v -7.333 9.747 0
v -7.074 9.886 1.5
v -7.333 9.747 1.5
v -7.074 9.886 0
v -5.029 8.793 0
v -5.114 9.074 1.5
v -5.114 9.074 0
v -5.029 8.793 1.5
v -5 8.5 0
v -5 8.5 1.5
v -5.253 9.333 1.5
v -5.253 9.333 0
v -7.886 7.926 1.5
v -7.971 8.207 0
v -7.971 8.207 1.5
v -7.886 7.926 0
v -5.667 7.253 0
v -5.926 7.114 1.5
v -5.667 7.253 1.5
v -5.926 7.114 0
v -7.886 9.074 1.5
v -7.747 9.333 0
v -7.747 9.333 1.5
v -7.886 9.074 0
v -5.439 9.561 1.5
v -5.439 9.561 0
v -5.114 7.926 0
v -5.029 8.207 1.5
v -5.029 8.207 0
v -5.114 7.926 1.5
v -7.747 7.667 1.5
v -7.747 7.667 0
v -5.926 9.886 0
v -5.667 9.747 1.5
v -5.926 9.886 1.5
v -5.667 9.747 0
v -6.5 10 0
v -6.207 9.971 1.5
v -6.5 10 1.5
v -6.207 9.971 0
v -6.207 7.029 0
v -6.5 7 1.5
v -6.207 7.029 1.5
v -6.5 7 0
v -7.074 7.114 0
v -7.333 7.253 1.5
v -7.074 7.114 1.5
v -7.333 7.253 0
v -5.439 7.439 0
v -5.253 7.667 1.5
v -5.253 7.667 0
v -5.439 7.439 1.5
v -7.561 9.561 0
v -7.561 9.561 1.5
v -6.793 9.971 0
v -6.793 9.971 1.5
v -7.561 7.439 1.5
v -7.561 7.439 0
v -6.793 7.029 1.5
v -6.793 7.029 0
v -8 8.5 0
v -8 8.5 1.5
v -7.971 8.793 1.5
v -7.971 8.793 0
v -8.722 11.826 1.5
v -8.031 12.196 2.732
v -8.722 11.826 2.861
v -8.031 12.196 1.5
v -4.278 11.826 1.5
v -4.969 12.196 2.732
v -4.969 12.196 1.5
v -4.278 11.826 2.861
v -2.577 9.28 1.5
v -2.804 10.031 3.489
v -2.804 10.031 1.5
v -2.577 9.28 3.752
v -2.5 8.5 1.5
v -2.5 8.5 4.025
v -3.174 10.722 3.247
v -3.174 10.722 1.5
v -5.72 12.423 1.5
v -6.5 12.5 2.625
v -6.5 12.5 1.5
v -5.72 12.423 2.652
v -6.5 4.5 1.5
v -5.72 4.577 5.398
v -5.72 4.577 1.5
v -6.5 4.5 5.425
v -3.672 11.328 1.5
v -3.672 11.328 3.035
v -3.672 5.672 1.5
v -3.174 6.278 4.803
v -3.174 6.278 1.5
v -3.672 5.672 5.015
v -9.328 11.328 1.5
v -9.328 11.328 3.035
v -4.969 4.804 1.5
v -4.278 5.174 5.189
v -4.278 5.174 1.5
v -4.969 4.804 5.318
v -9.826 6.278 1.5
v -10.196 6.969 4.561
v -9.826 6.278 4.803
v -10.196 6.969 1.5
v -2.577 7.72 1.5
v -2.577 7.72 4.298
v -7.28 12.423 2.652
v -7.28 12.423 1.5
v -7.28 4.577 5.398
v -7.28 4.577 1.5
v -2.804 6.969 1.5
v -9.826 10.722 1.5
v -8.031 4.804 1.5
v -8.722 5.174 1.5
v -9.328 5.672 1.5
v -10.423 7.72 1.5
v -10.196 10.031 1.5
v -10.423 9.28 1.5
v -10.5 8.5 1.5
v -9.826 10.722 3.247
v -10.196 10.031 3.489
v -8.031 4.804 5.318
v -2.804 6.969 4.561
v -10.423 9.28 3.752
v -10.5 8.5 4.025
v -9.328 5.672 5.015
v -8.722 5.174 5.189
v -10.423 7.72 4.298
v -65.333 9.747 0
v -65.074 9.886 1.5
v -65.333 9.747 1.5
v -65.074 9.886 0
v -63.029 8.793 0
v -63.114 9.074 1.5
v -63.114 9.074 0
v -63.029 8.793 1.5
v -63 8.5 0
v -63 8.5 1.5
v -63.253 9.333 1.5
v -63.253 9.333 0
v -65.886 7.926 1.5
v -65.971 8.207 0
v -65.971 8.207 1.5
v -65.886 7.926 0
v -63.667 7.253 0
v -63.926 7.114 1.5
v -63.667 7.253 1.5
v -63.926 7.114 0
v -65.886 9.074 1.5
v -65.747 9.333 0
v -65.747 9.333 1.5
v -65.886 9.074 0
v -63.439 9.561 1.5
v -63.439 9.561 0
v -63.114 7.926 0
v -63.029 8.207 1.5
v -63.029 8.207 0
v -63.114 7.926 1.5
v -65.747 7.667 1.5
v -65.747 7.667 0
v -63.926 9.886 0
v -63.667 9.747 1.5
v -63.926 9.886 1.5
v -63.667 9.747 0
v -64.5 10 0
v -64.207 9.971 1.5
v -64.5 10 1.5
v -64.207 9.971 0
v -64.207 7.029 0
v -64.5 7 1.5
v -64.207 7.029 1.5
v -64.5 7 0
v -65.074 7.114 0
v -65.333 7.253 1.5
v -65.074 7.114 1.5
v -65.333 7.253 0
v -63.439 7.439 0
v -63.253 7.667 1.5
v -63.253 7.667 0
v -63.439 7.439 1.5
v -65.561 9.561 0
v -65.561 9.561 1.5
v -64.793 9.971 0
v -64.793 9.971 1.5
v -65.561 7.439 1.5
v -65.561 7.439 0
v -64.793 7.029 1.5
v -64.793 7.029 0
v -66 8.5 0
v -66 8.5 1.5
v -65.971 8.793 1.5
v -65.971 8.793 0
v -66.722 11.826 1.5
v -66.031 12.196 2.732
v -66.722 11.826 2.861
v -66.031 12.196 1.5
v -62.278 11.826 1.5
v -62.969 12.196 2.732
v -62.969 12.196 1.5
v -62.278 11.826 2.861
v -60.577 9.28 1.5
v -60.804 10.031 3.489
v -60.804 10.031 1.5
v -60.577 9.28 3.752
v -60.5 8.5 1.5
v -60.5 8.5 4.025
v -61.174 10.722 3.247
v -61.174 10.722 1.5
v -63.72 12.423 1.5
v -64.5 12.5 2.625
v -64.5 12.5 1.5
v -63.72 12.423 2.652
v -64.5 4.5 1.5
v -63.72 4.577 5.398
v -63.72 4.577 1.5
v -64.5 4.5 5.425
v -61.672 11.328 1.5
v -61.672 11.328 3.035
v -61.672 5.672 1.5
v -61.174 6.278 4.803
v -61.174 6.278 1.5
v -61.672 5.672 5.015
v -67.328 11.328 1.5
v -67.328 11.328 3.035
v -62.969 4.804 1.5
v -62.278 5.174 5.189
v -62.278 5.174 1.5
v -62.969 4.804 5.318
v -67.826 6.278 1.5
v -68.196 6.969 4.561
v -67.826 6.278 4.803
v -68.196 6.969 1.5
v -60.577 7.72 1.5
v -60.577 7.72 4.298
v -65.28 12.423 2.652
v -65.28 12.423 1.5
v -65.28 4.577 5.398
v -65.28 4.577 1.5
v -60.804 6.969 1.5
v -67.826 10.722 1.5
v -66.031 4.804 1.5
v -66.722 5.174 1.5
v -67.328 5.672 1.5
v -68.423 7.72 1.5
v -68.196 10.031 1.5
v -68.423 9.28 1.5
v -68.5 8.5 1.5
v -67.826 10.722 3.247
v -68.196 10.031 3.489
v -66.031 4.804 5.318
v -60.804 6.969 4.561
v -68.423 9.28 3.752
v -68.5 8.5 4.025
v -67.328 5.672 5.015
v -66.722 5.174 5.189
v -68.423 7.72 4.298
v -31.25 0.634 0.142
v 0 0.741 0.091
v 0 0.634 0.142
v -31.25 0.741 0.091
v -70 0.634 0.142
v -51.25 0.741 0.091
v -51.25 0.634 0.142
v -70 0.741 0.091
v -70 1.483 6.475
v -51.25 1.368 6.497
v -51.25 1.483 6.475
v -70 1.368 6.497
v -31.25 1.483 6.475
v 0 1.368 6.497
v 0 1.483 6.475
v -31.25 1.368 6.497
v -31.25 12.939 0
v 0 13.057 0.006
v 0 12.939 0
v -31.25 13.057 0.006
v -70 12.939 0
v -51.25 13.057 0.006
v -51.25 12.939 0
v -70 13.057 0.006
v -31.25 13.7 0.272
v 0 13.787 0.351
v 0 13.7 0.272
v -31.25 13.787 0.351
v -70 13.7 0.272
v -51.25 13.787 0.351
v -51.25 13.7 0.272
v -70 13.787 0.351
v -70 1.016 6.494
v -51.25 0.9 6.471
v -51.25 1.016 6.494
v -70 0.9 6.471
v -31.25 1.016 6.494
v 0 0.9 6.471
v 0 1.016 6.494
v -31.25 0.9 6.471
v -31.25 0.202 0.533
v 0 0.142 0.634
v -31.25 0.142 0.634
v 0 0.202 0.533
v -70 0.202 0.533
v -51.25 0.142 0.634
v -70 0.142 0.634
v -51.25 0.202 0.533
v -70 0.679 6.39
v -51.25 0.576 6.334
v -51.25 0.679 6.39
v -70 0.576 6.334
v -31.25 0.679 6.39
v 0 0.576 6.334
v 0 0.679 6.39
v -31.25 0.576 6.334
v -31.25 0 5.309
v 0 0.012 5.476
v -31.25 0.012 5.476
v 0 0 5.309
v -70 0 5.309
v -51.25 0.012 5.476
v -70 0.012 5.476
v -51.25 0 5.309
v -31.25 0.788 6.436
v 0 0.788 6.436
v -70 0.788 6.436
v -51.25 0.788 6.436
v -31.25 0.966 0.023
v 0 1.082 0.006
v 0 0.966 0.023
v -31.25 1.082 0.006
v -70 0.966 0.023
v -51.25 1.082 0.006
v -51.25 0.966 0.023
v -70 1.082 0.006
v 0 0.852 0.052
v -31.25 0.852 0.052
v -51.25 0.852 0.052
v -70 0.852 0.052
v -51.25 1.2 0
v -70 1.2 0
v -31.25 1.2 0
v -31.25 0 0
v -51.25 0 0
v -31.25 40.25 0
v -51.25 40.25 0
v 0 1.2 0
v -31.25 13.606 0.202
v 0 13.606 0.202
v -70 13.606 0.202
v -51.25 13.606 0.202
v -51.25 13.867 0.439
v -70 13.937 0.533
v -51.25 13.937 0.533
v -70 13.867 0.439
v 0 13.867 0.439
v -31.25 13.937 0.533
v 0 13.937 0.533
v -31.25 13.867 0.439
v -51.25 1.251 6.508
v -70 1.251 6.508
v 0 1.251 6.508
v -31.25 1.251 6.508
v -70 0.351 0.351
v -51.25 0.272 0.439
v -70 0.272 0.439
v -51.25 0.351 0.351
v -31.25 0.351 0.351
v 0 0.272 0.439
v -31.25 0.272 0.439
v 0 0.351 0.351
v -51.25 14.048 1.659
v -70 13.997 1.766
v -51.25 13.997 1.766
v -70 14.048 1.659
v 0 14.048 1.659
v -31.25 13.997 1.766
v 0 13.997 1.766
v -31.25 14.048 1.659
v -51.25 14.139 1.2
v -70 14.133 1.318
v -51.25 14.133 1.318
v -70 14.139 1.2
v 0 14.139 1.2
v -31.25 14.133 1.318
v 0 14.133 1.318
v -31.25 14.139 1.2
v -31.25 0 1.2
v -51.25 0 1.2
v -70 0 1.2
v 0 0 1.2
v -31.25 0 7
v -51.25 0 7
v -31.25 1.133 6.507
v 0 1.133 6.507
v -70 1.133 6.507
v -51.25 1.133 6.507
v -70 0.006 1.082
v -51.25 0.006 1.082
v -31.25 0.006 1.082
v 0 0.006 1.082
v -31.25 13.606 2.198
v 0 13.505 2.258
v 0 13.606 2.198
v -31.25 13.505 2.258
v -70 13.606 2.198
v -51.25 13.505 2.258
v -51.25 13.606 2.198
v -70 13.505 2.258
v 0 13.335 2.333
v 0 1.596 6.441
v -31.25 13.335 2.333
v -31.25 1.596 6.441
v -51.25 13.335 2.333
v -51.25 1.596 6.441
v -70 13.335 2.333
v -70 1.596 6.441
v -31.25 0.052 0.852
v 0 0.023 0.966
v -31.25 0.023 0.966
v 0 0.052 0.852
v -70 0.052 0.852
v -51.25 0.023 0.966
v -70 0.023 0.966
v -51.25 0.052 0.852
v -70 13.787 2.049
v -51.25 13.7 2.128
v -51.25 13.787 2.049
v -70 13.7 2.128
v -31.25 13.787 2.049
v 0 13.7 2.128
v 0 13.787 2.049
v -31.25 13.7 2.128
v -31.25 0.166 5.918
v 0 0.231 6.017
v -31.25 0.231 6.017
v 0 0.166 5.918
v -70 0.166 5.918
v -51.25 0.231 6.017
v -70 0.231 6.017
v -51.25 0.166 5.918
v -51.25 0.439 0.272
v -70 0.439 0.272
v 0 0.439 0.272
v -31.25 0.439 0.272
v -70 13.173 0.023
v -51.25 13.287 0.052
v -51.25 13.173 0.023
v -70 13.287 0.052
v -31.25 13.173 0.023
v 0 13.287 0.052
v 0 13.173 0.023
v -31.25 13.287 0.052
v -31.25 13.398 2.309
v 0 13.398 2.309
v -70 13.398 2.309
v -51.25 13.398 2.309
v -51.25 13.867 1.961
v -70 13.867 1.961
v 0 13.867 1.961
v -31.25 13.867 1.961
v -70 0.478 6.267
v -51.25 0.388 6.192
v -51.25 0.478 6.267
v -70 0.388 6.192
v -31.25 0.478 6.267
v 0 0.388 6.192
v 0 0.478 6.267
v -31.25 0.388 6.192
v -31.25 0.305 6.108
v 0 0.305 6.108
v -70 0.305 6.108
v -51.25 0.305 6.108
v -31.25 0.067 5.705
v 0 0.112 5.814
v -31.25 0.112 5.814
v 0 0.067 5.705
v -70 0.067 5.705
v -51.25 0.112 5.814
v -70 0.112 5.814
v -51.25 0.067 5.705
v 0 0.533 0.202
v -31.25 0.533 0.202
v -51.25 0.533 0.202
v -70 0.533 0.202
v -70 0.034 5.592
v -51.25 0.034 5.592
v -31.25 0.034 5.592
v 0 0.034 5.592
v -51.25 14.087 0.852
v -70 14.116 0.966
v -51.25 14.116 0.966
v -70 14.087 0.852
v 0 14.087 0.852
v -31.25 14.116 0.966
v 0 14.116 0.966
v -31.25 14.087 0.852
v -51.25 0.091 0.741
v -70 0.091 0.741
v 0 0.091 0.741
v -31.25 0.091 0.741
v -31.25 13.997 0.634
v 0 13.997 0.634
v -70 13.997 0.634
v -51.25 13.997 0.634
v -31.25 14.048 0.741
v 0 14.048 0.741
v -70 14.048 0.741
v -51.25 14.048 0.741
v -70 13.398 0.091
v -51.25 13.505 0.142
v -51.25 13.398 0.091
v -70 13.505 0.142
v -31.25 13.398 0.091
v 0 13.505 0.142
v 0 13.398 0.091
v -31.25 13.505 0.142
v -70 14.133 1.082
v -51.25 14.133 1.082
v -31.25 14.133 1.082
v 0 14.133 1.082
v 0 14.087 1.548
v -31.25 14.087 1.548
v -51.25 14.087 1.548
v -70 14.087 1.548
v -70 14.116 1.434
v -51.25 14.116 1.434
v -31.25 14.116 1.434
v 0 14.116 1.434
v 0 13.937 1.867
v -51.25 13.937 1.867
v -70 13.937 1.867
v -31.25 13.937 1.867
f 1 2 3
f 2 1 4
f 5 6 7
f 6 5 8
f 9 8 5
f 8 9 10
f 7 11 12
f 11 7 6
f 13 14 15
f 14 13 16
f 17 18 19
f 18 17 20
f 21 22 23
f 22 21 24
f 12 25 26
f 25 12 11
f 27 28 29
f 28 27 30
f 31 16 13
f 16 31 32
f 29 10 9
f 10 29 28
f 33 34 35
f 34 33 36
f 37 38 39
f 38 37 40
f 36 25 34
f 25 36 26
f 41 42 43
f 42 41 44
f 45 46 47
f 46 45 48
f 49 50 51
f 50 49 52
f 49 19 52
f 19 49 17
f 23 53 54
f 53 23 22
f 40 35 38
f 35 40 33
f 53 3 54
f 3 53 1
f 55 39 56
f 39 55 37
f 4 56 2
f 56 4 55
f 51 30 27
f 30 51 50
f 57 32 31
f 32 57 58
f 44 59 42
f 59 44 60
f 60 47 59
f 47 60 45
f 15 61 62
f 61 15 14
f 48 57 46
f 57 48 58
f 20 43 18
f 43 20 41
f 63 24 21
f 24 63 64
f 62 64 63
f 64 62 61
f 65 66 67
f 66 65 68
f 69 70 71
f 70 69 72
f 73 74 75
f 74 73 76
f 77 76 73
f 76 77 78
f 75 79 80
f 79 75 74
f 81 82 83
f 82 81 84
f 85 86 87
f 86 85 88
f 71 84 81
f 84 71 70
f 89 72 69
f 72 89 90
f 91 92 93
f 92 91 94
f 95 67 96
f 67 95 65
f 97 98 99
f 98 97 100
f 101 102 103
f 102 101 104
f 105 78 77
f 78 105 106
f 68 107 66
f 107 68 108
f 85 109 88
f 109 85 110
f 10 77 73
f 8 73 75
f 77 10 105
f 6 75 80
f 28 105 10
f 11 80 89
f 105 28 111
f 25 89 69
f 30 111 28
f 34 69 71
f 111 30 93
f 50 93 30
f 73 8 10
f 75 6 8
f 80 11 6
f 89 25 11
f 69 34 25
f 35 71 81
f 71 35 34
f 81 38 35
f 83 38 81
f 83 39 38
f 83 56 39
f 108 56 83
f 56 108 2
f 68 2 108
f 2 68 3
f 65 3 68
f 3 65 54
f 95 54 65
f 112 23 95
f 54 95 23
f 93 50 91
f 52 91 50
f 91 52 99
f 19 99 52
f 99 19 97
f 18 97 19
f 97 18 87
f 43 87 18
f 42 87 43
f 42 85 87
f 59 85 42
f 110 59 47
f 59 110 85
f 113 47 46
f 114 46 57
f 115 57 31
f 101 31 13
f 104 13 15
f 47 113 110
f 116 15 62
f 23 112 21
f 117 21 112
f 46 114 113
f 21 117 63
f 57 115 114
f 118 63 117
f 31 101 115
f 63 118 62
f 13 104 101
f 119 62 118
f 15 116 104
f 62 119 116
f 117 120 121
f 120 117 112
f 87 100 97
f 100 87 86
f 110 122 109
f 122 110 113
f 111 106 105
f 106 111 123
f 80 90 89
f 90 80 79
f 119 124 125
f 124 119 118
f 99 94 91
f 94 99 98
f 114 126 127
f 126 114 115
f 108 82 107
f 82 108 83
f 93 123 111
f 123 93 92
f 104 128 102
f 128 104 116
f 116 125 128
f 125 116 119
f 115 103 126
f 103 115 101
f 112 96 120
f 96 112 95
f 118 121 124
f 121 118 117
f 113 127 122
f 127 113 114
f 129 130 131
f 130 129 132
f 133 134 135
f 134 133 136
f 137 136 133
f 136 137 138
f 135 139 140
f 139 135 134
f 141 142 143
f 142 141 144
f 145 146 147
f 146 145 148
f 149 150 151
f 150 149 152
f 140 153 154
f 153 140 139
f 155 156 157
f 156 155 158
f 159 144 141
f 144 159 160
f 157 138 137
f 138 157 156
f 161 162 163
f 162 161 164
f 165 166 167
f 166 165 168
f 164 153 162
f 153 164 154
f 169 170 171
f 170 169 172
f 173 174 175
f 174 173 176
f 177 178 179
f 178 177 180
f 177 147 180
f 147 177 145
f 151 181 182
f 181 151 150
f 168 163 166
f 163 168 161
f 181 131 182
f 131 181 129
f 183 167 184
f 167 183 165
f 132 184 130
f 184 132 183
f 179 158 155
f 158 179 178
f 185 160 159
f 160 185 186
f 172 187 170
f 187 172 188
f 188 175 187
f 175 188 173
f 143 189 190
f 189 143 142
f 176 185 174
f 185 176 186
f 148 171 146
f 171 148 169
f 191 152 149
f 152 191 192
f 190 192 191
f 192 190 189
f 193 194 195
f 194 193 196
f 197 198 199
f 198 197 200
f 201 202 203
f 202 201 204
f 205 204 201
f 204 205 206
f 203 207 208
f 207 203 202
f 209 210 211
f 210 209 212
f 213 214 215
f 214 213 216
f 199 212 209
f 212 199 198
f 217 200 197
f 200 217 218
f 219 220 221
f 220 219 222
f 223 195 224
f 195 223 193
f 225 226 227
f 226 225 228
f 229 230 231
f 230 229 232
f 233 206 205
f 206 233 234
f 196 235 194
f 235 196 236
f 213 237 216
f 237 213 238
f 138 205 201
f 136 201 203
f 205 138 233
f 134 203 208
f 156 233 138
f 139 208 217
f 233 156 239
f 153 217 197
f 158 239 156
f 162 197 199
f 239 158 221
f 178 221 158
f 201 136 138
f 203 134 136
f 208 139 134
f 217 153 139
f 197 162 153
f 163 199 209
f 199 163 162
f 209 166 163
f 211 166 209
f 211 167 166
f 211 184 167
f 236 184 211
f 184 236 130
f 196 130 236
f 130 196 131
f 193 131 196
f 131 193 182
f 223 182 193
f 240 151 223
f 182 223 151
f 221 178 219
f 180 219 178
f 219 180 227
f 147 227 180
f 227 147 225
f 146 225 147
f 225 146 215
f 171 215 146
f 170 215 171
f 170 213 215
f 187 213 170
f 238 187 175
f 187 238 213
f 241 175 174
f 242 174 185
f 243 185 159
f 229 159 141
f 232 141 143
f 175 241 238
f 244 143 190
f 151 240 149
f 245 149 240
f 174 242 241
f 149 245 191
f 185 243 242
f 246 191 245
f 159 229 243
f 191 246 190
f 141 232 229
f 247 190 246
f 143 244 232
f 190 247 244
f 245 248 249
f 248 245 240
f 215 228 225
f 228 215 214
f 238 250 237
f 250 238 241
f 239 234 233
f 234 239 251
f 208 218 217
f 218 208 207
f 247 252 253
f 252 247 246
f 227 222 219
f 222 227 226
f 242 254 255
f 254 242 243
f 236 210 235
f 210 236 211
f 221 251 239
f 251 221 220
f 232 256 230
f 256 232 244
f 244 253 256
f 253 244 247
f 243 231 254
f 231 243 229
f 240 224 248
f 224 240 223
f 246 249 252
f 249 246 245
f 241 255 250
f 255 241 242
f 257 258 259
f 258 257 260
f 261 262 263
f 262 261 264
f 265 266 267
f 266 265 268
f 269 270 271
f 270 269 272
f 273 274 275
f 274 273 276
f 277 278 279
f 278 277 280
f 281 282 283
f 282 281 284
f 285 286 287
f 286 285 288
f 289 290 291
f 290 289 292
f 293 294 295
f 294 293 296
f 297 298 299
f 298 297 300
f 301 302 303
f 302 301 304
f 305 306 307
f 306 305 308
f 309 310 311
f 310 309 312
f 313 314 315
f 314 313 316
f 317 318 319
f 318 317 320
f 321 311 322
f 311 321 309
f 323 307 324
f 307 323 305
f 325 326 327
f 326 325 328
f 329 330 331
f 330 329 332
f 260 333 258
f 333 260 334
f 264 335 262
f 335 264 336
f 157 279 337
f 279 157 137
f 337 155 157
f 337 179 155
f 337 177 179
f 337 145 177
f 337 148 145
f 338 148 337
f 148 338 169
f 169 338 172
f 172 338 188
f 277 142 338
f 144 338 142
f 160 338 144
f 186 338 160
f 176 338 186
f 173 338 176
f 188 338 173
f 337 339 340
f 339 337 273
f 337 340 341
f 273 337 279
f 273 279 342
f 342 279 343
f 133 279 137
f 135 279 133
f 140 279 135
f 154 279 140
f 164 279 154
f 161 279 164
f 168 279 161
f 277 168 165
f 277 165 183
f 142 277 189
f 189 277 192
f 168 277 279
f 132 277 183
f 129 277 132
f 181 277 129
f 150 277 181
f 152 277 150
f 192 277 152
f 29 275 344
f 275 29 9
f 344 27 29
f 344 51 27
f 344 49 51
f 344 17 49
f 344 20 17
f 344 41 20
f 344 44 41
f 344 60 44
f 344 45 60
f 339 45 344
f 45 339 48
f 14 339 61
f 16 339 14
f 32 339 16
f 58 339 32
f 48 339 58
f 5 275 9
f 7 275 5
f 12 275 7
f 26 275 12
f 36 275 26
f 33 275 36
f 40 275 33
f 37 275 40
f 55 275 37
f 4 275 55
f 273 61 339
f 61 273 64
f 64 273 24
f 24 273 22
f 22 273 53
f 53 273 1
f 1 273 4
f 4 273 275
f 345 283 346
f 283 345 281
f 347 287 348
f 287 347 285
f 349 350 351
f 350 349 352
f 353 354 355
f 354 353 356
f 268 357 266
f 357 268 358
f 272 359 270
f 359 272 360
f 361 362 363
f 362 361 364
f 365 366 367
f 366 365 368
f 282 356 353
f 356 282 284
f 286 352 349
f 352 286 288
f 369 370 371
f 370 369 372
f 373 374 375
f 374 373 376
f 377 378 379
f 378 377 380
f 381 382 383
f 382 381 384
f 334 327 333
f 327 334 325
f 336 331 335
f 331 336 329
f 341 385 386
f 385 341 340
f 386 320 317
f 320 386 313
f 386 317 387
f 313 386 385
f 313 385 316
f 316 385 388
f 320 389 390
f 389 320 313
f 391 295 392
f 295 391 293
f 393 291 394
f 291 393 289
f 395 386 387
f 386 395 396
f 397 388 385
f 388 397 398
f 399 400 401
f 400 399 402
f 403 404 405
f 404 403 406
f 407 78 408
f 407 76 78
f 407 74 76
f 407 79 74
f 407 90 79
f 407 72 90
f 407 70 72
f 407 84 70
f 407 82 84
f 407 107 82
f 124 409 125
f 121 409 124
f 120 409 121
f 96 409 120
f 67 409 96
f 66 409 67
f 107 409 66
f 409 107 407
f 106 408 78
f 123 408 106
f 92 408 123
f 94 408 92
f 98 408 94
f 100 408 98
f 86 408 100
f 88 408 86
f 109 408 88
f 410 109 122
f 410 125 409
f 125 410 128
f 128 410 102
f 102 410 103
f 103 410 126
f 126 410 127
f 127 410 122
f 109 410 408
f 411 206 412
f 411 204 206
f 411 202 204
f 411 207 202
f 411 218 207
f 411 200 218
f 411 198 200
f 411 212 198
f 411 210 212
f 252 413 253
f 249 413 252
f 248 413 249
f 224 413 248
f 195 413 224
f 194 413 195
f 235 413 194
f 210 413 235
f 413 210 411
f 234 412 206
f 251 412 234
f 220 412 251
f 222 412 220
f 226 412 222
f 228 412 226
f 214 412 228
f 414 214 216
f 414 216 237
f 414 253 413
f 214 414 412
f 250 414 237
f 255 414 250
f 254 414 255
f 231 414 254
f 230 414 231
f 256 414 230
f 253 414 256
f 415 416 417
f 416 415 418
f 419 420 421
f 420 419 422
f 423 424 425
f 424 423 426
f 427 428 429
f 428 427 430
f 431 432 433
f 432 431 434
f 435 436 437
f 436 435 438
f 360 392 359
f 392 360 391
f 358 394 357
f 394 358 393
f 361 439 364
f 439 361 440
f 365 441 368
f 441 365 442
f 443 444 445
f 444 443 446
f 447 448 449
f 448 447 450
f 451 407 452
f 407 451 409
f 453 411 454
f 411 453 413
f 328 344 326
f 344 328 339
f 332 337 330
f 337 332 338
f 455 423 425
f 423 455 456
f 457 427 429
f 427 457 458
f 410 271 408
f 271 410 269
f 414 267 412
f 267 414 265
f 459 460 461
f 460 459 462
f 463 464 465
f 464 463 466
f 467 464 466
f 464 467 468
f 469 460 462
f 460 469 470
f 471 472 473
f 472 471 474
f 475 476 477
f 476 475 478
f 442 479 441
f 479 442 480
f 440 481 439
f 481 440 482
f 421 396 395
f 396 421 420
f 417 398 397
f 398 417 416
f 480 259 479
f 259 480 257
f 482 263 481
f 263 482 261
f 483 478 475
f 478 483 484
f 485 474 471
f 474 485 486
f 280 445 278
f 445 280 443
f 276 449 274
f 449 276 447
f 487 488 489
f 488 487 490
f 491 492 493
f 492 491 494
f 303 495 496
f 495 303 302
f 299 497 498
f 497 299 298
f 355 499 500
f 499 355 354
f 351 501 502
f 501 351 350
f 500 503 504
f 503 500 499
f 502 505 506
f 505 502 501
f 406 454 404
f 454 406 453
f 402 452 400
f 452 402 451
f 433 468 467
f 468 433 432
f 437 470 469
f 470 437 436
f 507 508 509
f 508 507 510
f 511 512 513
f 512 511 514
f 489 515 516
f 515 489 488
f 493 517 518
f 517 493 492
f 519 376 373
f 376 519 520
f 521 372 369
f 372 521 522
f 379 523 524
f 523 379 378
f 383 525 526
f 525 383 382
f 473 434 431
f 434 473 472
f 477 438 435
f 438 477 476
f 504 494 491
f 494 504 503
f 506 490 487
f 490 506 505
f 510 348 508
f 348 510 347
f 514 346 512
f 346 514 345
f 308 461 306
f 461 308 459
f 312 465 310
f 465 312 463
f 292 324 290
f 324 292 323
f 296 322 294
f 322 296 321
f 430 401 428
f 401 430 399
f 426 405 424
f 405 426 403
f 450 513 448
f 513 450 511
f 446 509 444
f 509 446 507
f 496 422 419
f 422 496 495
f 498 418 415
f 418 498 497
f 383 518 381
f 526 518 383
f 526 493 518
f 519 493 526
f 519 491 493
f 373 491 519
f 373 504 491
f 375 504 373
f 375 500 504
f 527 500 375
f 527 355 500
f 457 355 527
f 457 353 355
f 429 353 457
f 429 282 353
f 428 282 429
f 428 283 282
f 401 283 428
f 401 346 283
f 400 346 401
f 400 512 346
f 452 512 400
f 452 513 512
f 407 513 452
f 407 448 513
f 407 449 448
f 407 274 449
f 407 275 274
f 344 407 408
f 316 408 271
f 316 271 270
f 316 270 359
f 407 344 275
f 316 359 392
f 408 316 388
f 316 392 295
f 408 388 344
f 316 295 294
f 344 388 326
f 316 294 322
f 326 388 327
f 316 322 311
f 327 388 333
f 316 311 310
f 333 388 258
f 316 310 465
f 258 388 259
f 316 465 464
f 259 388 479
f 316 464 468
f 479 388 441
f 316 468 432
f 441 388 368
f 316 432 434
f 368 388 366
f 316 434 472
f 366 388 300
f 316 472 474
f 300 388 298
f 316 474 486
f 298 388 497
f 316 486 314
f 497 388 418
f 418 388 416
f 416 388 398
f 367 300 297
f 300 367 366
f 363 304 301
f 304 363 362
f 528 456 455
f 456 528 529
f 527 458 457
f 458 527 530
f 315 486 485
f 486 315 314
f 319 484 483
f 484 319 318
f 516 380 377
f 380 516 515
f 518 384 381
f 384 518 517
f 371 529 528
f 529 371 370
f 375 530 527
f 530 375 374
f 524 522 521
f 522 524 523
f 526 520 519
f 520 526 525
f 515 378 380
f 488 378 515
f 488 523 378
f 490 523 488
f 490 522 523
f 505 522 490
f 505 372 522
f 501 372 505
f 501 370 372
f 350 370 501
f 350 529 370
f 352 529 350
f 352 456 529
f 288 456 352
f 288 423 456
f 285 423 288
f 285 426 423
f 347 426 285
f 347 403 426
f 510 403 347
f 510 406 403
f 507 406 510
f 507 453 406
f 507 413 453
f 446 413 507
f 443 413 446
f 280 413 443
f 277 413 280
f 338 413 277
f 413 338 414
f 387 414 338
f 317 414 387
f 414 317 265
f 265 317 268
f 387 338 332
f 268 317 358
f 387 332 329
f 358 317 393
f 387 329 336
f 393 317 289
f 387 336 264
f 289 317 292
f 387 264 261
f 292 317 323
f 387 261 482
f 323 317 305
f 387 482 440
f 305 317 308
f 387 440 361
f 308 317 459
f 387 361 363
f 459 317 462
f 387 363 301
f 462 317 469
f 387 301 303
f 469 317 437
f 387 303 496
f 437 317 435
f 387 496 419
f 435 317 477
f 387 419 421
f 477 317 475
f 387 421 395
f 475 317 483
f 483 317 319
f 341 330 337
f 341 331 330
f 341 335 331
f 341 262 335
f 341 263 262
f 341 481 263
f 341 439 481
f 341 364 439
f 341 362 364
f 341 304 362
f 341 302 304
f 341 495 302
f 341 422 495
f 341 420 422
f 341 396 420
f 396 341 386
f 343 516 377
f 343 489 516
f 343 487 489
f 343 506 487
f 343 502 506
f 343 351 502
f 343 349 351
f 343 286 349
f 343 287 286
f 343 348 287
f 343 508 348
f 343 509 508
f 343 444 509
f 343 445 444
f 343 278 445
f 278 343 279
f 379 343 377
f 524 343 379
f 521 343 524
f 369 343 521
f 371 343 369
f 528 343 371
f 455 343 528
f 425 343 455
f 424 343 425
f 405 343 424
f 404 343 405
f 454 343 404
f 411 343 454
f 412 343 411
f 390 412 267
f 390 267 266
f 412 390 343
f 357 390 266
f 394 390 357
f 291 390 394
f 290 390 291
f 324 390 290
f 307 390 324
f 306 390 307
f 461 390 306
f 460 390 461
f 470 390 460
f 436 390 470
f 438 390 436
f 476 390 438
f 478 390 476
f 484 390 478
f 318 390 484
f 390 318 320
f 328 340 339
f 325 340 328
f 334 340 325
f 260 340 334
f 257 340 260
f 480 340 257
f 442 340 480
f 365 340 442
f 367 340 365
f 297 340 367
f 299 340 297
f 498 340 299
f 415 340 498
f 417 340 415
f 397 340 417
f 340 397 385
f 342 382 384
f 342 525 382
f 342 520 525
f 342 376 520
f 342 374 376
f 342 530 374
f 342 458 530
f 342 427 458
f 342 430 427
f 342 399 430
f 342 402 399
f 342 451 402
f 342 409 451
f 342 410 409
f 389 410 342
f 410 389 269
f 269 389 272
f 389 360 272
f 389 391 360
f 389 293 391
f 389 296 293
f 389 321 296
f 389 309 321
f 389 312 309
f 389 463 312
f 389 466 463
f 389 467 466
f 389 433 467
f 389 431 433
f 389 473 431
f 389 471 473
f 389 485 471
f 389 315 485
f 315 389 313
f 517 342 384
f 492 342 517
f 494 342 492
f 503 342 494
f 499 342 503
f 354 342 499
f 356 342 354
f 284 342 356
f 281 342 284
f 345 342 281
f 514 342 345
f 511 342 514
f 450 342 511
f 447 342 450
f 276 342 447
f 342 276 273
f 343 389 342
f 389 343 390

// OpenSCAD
// file: parts/screw_cutout.scad
/*
 * Nomad Core - Screw Cutout Module
 * M2.5 screw hole with hex nut recess access from bottom
 * 
 * Screw specs: M2.5 threading, 16mm long, TR8 hex head
 */

// ============================================
// SCREW CUTOUT CONFIGURATION
// ============================================
// All screw cutout settings:
// - Shaft diameter and height
// - Nut recess dimensions and positioning

// ============================================
// SCREW SPECIFICATIONS
// ============================================
screw_shaft_diameter = 3.0;   // Clearance for M2.5 screw (mm)
screw_shaft_height = 25.0;    // Full height to pass through (mm)
nut_recess_diameter = 8.0;    // Hex nut pocket diameter (mm)
nut_recess_height = 6.0;      // Hex nut pocket depth (mm)
nut_recess_offset = 4.5;      // Start position from bottom (mm)

// ============================================
// RENDER QUALITY
// ============================================
$fn = 32;

// ============================================
// SCREW CUTOUT MODULE
// ============================================
// Creates M2.5 screw hole with hex nut recess accessible from bottom
//
// Parameters: None (uses global specifications above)
//
// Usage: difference() { your_part(); translate([x,y,z]) screw_cutout(); }

module screw_cutout() {
    union() {
        // Screw shaft hole - full height to allow screw to pass through
        cylinder(h=screw_shaft_height, d=screw_shaft_diameter, center=false);
        
        // Hex nut recess - starts offset from bottom to create nut pocket
        translate([0, 0, nut_recess_offset])
            cylinder(h=nut_recess_height, d=nut_recess_diameter, center=false);
    }
}

// ============================================
// TEST RENDER (uncomment for visualization)
// ============================================
// screw_cutout();
//
// // Show reference cube to see the cutout in context
// %translate([0, 0, 5])
//     cube([15, 15, 5], center=true);
// file: module_mount_slim.scad
/*
 * Nomad Core - Module Mount Bracket
 * Mounting bracket for compute module (Raspberry Pi or compatible)
 * 
 * Single wedge-shaped bracket with M2.5 screw holes for secure mounting
 * Designed to attach to left side of main baseplate
 */

// ============================================
// IMPORTS
// ============================================
use <parts/screw_cutout.scad>

// ============================================
// MODULE MOUNT CONFIGURATION
// ============================================
// All module mount settings consolidated here for easy adjustment:
// - Wedge dimensions
// - Screw hole positions (matching Pi 3B+ pattern)
// - Component positioning

// ============================================
// WEDGE 1 DIMENSIONS (Long wedge with screw holes)
// ============================================
wedge1_size = [20.0, 70.0, 7.0];  // [Width, Length, Height] (mm)
nose_round_radius = 1.2;          // Radius to soften wedge nose/corners (mm)

// ============================================
// SCREW HOLE POSITIONS
// ============================================
// Hole positions on Wedge 1 match Pi 3B+ mounting pattern
hole1_offset = [6.5, 8.5];   // [Long edge, Short edge] distance (mm)
pi_length_spacing = 58.0;    // Standard Pi mounting spacing (mm)
hole2_offset = [hole1_offset[0] + pi_length_spacing, hole1_offset[1]];  // [64.5, 8.5] (mm)
screw_depth = -3.0;          // Inset from wedge surface (mm)

// ============================================
// RENDER QUALITY
// ============================================
$fn = 64;

// ============================================
// RIGHT ANGLE WEDGE MODULE
// ============================================
// Creates a right-angle triangular prism
//
// Parameters:
// - width: Triangle-to-triangle dimension (mm)
// - length: Back wall to nose dimension (mm)
// - height: Tall dimension (mm)

module wedge(width, length, height) {
    // Rotate to proper orientation for mounting
    rotate([0, 0, 90])
    rotate([90, 0, 0])
    translate([0, 0, -length])
    linear_extrude(height=length)
        offset(r=nose_round_radius)
        offset(delta=-nose_round_radius)
            polygon([
                [0, 0],        // Origin
                [width, 0],    // Right edge
                [0, height]    // Top corner
            ]);
}

// ============================================
// WEDGE 1 WITH SCREW HOLES
// ============================================
// Long wedge with two M2.5 screw holes matching Pi mounting pattern

module wedge1_with_holes() {
    difference() {
        // Main wedge body
        wedge(wedge1_size[0], wedge1_size[1], wedge1_size[2]);
        
        // First screw hole
        translate([-hole1_offset[0], hole1_offset[1], screw_depth])
            screw_cutout();
        
        // Second screw hole (Pi lengthwise spacing)
        translate([-hole2_offset[0], hole2_offset[1], screw_depth])
            screw_cutout();
    }
}

// ============================================
// COMPLETE MODULE MOUNT ASSEMBLY
// ============================================
module module_mount() {
    union() {
        // Wedge 1 (long wedge with screw holes)
        wedge1_with_holes();
    }
}

// ============================================
// MAIN RENDER
// ============================================
module_mount();
// main file
/*
 * Nomad Core - Module Mount Bracket
 * Mounting bracket for compute module (Raspberry Pi or compatible)
 * 
 * Two wedge-shaped brackets with M2.5 screw holes for secure mounting
 * Designed to attach to left side of main baseplate
 */

// ============================================
// IMPORTS
// ============================================
use <module_mount_slim.scad>

// ============================================
// MODULE MOUNT CONFIGURATION
// ============================================
// All module mount settings consolidated here for easy adjustment:
// - Wedge 2 dimensions
// - Component positioning

// ============================================
// WEDGE 2 DIMENSIONS (Front wedge)
// ============================================
wedge2_size = [40.25, 20.0, 7.0];  // [Width, Length, Height] (mm)
wedge2_pos = [-31.25, 0, 0];       // [X, Y, Z] position offset (mm)

// ============================================
// RENDER QUALITY
// ============================================
$fn = 64;

// ============================================
// RIGHT ANGLE WEDGE MODULE
// ============================================
// Creates a right-angle triangular prism
//
// Parameters:
// - width: Triangle-to-triangle dimension (mm)
// - length: Back wall to nose dimension (mm)
// - height: Tall dimension (mm)

module wedge(width, length, height) {
    // Rotate to proper orientation for mounting
    rotate([0, 0, 90])
    rotate([90, 0, 0])
    translate([0, 0, -length])
    linear_extrude(height=length)
        polygon([
            [0, 0],        // Origin
            [width, 0],    // Right edge
            [0, height]    // Top corner
        ]);
}

// ============================================
// WEDGE 2 BODY
// ============================================
// Front wedge without screw holes

module wedge2_body() {
    wedge(wedge2_size[0], wedge2_size[1], wedge2_size[2]);
}

// ============================================
// COMPLETE MODULE MOUNT ASSEMBLY
// ============================================
module module_mount() {
    union() {
        // Wedge 1 from slim model (same origin/placement)
        wedge1_with_holes();
        
        // Wedge 2 (positioned between screw holes)
        translate(wedge2_pos)
            wedge2_body();
    }
}

// ============================================
// MAIN RENDER
// ============================================
module_mount();
